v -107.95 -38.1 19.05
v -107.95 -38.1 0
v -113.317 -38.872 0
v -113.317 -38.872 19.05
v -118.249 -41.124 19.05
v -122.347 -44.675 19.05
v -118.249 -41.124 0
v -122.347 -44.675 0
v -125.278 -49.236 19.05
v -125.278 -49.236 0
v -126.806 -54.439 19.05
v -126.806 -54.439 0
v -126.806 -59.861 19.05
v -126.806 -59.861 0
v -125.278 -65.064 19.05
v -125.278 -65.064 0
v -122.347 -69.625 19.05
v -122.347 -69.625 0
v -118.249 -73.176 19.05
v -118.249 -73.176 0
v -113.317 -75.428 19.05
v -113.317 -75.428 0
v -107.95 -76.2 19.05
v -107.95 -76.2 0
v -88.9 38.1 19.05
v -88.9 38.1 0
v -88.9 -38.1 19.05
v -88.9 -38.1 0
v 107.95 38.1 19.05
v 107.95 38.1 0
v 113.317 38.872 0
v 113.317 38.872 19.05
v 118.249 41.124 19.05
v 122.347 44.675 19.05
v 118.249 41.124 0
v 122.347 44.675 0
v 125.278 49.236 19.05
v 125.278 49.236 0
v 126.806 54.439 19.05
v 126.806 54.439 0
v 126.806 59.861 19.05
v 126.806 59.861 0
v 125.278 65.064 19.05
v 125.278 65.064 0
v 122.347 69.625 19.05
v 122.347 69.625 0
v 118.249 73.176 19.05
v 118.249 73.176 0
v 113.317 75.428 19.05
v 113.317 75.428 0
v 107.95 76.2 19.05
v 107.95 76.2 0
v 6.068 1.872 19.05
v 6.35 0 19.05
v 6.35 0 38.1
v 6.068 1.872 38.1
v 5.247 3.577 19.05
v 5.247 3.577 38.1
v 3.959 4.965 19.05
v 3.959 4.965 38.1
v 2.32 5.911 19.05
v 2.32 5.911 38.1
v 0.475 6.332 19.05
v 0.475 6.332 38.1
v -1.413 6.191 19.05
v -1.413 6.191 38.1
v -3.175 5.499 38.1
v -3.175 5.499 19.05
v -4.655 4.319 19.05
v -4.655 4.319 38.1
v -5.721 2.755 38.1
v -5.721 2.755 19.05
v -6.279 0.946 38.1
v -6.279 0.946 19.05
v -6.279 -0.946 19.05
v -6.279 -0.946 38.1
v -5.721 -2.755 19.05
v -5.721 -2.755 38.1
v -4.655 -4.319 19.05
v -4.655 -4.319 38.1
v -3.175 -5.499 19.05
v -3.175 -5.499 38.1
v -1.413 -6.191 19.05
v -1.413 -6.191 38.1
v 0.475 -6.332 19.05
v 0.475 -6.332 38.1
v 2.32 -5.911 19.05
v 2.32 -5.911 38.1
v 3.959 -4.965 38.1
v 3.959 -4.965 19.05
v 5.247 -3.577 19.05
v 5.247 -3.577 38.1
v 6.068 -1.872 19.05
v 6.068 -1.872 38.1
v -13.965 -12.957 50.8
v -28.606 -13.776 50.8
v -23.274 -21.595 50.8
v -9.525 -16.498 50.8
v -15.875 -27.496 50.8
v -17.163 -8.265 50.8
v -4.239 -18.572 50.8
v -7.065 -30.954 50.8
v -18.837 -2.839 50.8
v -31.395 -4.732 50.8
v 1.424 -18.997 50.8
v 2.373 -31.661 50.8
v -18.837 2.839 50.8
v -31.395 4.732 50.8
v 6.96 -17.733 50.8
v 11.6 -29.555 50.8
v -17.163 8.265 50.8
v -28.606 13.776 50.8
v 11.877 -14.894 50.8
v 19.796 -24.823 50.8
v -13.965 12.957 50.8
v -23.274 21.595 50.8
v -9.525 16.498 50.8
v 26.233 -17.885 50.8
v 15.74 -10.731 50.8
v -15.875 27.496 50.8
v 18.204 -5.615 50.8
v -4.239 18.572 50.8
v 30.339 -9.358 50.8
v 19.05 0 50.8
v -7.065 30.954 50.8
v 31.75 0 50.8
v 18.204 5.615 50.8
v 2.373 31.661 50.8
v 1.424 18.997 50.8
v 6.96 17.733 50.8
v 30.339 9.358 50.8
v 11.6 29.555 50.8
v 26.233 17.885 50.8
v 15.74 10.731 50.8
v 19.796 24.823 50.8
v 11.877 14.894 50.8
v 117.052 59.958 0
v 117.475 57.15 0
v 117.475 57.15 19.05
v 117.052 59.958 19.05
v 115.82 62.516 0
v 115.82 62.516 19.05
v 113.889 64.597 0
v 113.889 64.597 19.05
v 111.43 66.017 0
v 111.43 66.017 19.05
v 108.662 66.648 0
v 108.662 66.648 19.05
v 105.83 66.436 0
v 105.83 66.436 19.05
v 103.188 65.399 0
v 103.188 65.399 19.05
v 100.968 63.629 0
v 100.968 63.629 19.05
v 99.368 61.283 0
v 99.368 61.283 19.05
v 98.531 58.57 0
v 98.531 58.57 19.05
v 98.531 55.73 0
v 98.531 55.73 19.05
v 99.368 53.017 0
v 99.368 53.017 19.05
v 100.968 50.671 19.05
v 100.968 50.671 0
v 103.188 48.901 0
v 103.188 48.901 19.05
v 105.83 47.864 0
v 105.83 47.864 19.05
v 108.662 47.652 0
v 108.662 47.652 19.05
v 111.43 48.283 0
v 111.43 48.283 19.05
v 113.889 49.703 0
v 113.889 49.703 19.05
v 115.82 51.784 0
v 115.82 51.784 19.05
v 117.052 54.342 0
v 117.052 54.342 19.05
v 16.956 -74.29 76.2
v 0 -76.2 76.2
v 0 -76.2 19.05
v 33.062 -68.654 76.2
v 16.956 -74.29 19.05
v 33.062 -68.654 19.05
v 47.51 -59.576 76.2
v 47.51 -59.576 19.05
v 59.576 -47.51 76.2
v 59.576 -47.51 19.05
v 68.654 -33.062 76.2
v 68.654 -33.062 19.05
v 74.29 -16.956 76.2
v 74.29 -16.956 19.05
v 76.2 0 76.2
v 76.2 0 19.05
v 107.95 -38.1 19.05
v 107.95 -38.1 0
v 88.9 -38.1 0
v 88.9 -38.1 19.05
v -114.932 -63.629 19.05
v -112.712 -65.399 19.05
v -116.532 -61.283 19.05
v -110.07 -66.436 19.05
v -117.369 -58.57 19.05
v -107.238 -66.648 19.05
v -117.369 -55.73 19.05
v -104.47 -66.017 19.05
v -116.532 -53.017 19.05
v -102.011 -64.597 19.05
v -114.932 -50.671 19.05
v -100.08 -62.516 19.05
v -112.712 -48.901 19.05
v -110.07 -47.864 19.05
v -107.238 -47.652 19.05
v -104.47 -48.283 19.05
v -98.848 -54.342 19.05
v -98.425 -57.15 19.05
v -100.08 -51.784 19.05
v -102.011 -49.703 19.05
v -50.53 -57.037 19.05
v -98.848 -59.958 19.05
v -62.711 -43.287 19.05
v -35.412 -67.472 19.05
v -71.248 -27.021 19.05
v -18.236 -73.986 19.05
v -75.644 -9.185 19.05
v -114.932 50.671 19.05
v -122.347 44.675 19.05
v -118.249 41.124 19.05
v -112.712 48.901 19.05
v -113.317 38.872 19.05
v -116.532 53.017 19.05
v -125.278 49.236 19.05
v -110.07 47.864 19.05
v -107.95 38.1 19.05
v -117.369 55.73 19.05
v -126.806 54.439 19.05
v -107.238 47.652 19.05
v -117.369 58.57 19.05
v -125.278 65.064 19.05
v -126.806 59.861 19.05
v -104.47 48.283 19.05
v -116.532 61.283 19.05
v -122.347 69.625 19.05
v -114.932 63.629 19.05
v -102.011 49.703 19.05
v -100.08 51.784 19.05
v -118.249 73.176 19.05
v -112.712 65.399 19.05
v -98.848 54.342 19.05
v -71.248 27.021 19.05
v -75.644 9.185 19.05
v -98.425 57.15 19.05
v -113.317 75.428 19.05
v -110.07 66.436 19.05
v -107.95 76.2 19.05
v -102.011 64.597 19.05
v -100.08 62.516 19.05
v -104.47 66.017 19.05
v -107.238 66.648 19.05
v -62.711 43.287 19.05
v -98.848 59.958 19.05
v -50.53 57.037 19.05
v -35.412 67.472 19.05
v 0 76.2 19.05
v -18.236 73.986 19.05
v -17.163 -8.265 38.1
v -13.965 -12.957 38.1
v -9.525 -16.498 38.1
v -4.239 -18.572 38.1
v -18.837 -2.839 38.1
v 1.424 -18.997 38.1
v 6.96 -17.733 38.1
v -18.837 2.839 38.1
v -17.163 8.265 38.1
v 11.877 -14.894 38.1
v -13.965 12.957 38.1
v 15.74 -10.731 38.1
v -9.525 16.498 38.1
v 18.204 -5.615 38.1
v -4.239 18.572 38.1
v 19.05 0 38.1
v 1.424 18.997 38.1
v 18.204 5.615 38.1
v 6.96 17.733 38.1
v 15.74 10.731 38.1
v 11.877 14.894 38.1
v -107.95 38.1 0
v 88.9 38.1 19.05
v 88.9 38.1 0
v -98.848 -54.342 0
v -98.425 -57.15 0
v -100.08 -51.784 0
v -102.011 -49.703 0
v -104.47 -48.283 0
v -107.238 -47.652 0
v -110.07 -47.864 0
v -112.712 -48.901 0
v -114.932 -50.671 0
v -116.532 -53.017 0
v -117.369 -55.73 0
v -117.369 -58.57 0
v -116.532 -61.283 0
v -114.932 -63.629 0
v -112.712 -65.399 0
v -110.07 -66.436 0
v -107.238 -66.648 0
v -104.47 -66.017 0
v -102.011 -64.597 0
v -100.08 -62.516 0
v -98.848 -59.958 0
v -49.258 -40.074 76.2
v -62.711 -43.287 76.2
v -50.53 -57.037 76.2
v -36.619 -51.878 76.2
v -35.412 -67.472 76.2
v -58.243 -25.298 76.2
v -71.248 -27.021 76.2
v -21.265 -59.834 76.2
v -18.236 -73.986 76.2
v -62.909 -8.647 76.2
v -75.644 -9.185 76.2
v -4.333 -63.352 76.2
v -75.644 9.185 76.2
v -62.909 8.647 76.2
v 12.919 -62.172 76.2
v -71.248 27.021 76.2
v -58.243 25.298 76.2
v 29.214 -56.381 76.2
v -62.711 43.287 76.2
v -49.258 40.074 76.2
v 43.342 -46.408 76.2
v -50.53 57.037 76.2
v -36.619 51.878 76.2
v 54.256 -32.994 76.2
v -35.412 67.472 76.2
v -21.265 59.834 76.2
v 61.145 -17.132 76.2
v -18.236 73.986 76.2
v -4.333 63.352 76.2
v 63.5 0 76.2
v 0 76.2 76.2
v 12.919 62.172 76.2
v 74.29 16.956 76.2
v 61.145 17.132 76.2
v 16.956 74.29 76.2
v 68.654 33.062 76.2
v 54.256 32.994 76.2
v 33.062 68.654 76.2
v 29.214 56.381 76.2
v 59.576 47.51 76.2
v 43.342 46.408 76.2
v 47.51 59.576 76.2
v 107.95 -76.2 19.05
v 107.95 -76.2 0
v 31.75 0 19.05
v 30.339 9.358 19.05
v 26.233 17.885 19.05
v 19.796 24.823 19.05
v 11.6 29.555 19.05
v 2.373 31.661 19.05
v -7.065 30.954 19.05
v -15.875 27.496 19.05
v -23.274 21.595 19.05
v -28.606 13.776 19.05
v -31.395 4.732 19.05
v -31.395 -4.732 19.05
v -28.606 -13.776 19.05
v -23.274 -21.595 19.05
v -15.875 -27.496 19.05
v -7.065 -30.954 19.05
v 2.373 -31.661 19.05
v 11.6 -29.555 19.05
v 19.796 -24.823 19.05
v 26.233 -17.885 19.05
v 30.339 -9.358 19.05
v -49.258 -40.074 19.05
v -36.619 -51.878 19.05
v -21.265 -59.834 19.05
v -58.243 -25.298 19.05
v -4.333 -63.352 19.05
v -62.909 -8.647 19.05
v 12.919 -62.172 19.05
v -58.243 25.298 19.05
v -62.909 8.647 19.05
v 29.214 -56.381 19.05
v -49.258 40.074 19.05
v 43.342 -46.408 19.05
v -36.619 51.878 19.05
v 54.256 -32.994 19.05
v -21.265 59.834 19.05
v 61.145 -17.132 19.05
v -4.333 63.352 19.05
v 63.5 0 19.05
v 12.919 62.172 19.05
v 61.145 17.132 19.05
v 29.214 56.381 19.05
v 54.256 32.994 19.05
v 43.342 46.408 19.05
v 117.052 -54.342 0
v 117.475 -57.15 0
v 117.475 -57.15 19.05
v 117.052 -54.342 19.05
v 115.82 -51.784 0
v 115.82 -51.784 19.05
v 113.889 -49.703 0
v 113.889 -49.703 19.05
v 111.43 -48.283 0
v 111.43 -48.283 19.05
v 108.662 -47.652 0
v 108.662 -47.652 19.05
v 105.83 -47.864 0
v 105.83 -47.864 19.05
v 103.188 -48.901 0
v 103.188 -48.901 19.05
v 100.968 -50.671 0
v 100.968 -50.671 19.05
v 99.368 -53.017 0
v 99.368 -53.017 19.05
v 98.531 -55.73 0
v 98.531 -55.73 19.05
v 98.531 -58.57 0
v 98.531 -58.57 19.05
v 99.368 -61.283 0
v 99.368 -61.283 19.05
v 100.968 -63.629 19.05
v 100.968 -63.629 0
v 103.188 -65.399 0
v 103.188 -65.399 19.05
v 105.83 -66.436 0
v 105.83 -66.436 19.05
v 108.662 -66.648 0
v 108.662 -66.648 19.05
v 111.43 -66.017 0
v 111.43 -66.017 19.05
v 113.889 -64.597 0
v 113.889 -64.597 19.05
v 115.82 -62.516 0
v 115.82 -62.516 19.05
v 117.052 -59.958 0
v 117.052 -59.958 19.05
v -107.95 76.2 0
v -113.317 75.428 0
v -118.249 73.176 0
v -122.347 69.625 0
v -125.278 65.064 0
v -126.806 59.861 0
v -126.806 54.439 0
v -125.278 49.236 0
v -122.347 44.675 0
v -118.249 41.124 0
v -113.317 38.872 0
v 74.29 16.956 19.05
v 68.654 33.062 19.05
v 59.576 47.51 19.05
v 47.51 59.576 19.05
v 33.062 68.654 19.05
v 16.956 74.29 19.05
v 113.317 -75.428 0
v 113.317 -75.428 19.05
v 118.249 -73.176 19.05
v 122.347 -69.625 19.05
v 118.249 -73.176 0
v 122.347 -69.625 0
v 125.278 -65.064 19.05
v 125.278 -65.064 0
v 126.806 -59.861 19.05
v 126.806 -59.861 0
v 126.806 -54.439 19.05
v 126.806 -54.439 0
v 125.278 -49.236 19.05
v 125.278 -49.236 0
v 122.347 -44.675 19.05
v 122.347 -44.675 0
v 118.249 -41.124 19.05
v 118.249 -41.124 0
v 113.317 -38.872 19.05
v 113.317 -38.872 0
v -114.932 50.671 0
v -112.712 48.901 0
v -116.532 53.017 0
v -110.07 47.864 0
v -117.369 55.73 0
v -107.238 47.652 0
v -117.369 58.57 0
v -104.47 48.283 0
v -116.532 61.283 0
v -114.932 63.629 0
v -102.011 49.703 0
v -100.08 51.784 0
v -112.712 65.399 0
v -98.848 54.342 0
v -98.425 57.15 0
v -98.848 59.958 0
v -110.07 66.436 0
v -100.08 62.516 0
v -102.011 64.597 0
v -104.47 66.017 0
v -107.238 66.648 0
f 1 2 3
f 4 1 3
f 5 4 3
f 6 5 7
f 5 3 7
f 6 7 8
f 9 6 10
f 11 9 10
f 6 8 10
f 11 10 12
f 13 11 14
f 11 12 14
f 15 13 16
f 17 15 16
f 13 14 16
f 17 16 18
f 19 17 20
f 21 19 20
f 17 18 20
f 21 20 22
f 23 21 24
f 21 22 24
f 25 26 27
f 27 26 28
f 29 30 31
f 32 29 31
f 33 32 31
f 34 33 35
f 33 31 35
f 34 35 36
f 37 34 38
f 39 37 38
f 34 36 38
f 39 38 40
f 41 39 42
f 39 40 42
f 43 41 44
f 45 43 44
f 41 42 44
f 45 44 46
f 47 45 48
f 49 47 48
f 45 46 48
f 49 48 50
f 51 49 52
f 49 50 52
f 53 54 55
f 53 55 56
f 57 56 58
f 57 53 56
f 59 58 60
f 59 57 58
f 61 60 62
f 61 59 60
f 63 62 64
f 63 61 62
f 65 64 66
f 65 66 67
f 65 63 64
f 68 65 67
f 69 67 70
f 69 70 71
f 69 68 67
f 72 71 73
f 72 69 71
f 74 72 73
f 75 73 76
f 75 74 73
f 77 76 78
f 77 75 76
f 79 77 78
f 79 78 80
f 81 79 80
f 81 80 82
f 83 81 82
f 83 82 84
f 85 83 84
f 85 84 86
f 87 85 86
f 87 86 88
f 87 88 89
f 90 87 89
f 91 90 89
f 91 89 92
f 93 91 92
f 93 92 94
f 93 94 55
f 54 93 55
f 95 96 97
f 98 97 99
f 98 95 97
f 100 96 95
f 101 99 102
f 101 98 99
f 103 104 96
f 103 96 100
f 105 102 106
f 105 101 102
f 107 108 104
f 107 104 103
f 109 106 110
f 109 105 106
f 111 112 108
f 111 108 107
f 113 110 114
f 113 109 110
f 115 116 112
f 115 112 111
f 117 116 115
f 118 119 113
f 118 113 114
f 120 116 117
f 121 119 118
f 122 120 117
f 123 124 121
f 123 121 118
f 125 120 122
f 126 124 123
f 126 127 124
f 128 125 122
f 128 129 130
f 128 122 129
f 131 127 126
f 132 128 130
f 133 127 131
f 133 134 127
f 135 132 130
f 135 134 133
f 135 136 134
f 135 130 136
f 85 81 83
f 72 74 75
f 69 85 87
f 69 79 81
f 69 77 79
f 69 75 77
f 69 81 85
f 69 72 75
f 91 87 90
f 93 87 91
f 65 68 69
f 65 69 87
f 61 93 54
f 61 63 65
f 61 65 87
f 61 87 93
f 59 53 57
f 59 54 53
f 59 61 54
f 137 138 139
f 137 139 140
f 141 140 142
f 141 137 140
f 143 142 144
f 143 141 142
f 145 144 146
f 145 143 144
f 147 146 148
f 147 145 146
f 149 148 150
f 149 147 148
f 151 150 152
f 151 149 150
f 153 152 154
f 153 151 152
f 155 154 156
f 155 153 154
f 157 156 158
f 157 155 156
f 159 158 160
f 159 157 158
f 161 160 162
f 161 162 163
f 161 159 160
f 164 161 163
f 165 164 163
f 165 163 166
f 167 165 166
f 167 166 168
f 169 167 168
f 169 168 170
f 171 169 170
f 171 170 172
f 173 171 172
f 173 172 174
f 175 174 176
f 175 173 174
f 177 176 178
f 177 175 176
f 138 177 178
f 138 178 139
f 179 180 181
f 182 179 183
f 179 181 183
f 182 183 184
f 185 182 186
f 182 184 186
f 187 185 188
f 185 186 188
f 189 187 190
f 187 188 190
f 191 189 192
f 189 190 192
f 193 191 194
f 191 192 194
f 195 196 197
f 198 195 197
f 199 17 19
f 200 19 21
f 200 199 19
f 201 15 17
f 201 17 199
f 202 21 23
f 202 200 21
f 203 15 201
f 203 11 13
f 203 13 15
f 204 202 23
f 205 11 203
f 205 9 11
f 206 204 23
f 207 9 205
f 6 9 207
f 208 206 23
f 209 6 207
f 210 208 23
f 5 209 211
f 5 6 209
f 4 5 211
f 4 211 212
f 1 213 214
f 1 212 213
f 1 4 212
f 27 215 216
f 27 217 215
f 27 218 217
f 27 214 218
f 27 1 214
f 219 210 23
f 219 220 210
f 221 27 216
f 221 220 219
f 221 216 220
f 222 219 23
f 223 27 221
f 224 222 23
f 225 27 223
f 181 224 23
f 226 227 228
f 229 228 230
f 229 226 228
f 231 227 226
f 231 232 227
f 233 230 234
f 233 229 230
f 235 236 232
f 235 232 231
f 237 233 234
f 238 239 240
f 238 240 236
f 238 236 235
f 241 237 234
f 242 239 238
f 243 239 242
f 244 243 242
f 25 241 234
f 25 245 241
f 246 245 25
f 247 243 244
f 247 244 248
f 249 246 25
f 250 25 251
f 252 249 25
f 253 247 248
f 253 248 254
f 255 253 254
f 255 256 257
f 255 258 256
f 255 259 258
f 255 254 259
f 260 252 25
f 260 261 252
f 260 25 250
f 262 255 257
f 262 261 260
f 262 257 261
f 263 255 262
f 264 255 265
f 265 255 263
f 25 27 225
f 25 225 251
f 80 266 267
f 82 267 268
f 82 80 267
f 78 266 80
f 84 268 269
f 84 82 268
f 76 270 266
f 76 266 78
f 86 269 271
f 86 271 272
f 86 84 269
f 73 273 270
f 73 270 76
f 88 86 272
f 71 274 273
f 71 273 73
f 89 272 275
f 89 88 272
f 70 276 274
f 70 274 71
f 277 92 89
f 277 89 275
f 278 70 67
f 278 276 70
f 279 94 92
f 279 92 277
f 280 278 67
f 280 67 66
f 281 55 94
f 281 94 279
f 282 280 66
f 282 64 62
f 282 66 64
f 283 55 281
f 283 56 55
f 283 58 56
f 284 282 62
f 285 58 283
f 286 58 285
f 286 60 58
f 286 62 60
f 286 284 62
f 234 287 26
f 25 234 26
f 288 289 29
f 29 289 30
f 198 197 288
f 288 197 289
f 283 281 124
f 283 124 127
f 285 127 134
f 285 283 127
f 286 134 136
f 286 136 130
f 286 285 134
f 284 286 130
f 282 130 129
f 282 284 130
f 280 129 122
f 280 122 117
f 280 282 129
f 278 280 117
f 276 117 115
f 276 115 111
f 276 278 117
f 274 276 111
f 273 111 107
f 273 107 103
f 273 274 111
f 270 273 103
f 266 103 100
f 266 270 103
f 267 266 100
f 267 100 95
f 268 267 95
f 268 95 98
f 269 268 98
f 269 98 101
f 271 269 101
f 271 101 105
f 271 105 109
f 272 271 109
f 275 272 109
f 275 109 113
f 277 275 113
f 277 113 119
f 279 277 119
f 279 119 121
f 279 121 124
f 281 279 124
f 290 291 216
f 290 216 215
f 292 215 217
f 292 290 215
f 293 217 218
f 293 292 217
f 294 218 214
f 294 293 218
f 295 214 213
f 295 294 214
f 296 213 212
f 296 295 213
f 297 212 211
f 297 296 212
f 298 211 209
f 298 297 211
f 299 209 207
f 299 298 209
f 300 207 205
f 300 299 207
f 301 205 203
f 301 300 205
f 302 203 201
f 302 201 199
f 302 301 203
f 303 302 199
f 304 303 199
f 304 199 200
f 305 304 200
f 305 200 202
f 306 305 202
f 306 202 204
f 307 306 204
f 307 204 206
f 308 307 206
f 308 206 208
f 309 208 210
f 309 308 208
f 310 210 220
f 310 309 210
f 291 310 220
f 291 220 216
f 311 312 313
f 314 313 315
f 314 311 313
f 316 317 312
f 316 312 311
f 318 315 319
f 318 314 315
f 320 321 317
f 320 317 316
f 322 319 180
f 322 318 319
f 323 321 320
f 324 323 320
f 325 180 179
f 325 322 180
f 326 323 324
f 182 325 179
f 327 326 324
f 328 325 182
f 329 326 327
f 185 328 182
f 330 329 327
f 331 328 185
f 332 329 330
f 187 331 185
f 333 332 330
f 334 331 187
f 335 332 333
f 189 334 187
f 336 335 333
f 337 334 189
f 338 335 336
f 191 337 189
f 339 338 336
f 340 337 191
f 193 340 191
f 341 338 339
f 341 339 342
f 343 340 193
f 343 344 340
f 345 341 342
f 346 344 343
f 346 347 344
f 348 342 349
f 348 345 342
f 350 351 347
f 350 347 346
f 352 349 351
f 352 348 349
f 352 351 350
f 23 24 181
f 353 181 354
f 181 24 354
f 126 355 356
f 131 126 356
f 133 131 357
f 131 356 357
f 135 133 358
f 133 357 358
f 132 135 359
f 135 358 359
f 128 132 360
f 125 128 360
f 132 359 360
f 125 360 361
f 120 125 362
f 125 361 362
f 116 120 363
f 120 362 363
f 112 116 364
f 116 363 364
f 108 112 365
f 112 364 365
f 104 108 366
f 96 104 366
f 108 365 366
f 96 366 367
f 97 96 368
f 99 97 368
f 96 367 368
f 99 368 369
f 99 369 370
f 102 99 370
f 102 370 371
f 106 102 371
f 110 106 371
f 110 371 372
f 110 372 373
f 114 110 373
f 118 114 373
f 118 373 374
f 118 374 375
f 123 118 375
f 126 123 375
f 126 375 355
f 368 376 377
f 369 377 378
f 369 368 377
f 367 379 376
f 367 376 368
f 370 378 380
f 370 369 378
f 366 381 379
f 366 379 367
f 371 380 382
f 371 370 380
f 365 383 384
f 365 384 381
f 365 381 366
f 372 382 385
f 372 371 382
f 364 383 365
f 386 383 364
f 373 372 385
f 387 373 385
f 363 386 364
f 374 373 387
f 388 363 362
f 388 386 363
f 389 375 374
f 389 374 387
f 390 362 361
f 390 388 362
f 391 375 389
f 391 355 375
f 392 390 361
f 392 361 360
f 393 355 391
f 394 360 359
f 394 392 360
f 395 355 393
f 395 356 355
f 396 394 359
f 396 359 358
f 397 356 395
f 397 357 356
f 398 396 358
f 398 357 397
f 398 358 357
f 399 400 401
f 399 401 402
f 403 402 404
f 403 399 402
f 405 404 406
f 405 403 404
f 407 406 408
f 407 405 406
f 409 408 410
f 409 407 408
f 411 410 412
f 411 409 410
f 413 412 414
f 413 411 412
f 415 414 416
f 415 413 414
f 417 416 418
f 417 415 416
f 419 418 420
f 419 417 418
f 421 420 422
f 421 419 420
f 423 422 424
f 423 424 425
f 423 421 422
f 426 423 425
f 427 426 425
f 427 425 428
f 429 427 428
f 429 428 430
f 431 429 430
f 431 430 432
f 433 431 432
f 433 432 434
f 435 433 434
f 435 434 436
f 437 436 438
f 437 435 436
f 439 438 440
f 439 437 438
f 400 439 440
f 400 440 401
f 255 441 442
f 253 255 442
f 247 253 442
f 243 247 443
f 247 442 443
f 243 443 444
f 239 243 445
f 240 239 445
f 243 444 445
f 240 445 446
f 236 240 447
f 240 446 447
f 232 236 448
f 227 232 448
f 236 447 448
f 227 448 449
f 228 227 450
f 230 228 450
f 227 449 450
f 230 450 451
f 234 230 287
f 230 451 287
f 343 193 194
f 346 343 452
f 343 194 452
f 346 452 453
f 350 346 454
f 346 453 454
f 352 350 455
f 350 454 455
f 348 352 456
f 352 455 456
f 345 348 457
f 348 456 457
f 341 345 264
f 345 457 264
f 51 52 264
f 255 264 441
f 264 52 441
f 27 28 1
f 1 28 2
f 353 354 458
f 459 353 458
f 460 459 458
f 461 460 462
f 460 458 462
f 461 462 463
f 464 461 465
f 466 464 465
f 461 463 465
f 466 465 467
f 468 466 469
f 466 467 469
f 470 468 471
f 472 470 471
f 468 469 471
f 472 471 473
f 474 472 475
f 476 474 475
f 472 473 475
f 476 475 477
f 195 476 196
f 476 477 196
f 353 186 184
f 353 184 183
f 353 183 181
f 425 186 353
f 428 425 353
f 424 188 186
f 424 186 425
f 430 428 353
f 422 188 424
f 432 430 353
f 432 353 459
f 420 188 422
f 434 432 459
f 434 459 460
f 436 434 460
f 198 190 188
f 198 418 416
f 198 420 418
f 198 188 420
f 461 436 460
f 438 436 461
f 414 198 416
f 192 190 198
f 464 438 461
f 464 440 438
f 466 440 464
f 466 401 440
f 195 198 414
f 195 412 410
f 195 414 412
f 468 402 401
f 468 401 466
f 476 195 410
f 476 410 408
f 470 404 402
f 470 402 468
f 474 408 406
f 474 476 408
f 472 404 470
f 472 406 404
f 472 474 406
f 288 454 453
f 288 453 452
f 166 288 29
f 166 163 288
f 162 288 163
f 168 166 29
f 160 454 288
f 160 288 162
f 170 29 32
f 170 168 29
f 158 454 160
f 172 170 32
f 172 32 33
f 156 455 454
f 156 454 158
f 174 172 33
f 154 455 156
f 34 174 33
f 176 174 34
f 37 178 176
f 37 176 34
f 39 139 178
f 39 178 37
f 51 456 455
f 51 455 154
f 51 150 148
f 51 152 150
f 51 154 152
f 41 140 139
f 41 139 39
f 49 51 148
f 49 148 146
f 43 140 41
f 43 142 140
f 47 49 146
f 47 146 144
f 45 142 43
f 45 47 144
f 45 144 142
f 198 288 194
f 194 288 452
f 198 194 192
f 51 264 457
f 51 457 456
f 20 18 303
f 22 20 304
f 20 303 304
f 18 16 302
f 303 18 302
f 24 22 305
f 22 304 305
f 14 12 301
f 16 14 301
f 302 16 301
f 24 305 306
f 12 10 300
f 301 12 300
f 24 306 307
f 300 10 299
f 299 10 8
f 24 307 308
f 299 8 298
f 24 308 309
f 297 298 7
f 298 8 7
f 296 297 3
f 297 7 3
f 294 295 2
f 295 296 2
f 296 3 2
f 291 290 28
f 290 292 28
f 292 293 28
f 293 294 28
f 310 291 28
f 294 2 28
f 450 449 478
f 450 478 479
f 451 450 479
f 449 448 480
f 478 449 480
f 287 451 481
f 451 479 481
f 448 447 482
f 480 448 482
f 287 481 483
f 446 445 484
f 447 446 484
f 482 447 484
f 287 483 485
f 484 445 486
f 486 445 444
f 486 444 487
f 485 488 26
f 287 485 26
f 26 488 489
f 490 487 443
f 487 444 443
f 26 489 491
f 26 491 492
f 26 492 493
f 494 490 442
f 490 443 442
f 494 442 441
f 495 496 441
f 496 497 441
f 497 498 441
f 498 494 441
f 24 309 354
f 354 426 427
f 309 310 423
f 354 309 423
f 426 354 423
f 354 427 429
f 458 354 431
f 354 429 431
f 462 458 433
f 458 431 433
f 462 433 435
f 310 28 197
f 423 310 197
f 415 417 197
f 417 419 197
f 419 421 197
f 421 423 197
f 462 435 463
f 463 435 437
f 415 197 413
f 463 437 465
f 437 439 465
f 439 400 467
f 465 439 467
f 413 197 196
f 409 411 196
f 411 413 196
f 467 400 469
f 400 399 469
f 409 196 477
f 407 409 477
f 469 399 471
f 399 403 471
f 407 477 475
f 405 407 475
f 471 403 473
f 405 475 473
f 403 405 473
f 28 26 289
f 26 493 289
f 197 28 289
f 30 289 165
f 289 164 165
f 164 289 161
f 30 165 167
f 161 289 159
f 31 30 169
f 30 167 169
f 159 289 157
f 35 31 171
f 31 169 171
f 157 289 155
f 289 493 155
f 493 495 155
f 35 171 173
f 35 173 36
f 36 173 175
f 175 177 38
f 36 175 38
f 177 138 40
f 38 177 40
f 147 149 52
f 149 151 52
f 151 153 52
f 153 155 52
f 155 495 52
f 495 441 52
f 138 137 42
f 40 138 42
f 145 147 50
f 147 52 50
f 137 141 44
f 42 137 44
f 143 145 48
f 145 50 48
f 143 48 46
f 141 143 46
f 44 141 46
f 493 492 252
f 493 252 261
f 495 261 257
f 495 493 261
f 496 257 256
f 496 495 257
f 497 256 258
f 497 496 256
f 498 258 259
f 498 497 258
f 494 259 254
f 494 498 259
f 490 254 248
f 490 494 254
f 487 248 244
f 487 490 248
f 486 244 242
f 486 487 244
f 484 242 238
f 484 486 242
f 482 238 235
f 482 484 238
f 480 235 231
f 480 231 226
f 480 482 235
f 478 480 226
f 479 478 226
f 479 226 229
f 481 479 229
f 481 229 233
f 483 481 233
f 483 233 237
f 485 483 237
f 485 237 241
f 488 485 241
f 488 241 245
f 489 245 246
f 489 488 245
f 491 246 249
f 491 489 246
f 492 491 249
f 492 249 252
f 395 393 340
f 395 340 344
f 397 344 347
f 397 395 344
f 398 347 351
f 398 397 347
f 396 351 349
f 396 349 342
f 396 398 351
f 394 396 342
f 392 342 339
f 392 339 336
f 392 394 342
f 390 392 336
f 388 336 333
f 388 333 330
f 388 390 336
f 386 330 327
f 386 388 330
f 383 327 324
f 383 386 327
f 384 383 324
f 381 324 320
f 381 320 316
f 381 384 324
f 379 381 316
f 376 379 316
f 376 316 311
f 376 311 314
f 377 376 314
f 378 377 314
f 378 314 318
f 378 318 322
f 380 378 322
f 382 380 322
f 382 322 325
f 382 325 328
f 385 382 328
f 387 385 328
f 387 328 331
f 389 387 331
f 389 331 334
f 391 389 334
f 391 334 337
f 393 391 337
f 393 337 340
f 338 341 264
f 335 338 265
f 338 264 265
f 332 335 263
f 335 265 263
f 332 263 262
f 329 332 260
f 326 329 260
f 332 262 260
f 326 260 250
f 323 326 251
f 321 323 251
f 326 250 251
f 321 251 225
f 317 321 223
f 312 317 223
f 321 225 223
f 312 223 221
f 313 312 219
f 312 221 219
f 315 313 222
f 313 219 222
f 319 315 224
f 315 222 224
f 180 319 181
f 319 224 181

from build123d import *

# Parameters (mm, degrees)
F0_R     = 9.525
F0_R_2   = 63.5
F0_R_3   = 31.75
F0_R_4   = 19.05
F0_R_5   = 6.35
F1_DEPTH = 19.05
F2_DEPTH = 76.2
F3_DEPTH = 50.8
F4_DEPTH = 38.1


with BuildPart() as f1:
    # F0 (on Top) → F1 (new body)
    with BuildSketch(Plane.XY):
        with BuildLine():
            ThreePointArc((0, 76.2), (53.881537, 53.881537), (76.2, 0))
            ThreePointArc((76.2, 0), (53.881537, -53.881537), (0, -76.2))
            Line((0, -76.2), (88.9, -76.2))
            Line((88.9, -76.2), (107.95, -76.2))
            ThreePointArc((107.95, -76.2), (127, -57.15), (107.95, -38.1))
            Line((107.95, -38.1), (88.9, -38.1))
            Line((88.9, -38.1), (88.9, 38.1))
            Line((88.9, 38.1), (107.95, 38.1))
            ThreePointArc((107.95, 38.1), (127, 57.15), (107.95, 76.2))
            Line((107.95, 76.2), (88.9, 76.2))
            Line((88.9, 76.2), (0, 76.2))
        make_face()
        with Locations((107.95, -57.15)):
            Circle(F0_R, mode=Mode.SUBTRACT)
        with Locations((107.95, 57.15)):
            Circle(F0_R, mode=Mode.SUBTRACT)
        with BuildLine():
            ThreePointArc((0, -76.2), (-76.2, 0), (0, 76.2))
            Line((0, 76.2), (-88.9, 76.2))
            Line((-88.9, 76.2), (-107.95, 76.2))
            ThreePointArc((-107.95, 76.2), (-127, 57.15), (-107.95, 38.1))
            Line((-107.95, 38.1), (-88.9, 38.1))
            Line((-88.9, 38.1), (-88.9, -38.1))
            Line((-88.9, -38.1), (-107.95, -38.1))
            ThreePointArc((-107.95, -38.1), (-127, -57.15), (-107.95, -76.2))
            Line((-107.95, -76.2), (-88.9, -76.2))
            Line((-88.9, -76.2), (0, -76.2))
        make_face()
        with Locations((-107.95, -57.15)):
            Circle(F0_R, mode=Mode.SUBTRACT)
        with Locations((-107.95, 57.15)):
            Circle(F0_R, mode=Mode.SUBTRACT)
        Circle(F0_R_2)
        Circle(F0_R_3, mode=Mode.SUBTRACT)
        Circle(F0_R_3)
        Circle(F0_R_4, mode=Mode.SUBTRACT)
        Circle(F0_R_4)
        Circle(F0_R_5, mode=Mode.SUBTRACT)
        Circle(F0_R_5)
    extrude(amount=F1_DEPTH)

    # F0 (on Top) → F2 (join)
    with BuildSketch(Plane.XY):
        with BuildLine():
            ThreePointArc((0, -76.2), (53.881537, -53.881537), (76.2, 0))
            ThreePointArc((76.2, 0), (53.881537, 53.881537), (0, 76.2))
            ThreePointArc((0, 76.2), (-76.2, 0), (0, -76.2))
        make_face()
        Circle(F0_R_2, mode=Mode.SUBTRACT)
    extrude(amount=F2_DEPTH)

    # F0 (on Top) → F3 (join)
    with BuildSketch(Plane.XY):
        Circle(F0_R_3)
        Circle(F0_R_4, mode=Mode.SUBTRACT)
    extrude(amount=F3_DEPTH)

    # F0 (on Top) → F4 (join)
    with BuildSketch(Plane.XY):
        Circle(F0_R_4)
        Circle(F0_R_5, mode=Mode.SUBTRACT)
    extrude(amount=F4_DEPTH)


solid = f1.part
